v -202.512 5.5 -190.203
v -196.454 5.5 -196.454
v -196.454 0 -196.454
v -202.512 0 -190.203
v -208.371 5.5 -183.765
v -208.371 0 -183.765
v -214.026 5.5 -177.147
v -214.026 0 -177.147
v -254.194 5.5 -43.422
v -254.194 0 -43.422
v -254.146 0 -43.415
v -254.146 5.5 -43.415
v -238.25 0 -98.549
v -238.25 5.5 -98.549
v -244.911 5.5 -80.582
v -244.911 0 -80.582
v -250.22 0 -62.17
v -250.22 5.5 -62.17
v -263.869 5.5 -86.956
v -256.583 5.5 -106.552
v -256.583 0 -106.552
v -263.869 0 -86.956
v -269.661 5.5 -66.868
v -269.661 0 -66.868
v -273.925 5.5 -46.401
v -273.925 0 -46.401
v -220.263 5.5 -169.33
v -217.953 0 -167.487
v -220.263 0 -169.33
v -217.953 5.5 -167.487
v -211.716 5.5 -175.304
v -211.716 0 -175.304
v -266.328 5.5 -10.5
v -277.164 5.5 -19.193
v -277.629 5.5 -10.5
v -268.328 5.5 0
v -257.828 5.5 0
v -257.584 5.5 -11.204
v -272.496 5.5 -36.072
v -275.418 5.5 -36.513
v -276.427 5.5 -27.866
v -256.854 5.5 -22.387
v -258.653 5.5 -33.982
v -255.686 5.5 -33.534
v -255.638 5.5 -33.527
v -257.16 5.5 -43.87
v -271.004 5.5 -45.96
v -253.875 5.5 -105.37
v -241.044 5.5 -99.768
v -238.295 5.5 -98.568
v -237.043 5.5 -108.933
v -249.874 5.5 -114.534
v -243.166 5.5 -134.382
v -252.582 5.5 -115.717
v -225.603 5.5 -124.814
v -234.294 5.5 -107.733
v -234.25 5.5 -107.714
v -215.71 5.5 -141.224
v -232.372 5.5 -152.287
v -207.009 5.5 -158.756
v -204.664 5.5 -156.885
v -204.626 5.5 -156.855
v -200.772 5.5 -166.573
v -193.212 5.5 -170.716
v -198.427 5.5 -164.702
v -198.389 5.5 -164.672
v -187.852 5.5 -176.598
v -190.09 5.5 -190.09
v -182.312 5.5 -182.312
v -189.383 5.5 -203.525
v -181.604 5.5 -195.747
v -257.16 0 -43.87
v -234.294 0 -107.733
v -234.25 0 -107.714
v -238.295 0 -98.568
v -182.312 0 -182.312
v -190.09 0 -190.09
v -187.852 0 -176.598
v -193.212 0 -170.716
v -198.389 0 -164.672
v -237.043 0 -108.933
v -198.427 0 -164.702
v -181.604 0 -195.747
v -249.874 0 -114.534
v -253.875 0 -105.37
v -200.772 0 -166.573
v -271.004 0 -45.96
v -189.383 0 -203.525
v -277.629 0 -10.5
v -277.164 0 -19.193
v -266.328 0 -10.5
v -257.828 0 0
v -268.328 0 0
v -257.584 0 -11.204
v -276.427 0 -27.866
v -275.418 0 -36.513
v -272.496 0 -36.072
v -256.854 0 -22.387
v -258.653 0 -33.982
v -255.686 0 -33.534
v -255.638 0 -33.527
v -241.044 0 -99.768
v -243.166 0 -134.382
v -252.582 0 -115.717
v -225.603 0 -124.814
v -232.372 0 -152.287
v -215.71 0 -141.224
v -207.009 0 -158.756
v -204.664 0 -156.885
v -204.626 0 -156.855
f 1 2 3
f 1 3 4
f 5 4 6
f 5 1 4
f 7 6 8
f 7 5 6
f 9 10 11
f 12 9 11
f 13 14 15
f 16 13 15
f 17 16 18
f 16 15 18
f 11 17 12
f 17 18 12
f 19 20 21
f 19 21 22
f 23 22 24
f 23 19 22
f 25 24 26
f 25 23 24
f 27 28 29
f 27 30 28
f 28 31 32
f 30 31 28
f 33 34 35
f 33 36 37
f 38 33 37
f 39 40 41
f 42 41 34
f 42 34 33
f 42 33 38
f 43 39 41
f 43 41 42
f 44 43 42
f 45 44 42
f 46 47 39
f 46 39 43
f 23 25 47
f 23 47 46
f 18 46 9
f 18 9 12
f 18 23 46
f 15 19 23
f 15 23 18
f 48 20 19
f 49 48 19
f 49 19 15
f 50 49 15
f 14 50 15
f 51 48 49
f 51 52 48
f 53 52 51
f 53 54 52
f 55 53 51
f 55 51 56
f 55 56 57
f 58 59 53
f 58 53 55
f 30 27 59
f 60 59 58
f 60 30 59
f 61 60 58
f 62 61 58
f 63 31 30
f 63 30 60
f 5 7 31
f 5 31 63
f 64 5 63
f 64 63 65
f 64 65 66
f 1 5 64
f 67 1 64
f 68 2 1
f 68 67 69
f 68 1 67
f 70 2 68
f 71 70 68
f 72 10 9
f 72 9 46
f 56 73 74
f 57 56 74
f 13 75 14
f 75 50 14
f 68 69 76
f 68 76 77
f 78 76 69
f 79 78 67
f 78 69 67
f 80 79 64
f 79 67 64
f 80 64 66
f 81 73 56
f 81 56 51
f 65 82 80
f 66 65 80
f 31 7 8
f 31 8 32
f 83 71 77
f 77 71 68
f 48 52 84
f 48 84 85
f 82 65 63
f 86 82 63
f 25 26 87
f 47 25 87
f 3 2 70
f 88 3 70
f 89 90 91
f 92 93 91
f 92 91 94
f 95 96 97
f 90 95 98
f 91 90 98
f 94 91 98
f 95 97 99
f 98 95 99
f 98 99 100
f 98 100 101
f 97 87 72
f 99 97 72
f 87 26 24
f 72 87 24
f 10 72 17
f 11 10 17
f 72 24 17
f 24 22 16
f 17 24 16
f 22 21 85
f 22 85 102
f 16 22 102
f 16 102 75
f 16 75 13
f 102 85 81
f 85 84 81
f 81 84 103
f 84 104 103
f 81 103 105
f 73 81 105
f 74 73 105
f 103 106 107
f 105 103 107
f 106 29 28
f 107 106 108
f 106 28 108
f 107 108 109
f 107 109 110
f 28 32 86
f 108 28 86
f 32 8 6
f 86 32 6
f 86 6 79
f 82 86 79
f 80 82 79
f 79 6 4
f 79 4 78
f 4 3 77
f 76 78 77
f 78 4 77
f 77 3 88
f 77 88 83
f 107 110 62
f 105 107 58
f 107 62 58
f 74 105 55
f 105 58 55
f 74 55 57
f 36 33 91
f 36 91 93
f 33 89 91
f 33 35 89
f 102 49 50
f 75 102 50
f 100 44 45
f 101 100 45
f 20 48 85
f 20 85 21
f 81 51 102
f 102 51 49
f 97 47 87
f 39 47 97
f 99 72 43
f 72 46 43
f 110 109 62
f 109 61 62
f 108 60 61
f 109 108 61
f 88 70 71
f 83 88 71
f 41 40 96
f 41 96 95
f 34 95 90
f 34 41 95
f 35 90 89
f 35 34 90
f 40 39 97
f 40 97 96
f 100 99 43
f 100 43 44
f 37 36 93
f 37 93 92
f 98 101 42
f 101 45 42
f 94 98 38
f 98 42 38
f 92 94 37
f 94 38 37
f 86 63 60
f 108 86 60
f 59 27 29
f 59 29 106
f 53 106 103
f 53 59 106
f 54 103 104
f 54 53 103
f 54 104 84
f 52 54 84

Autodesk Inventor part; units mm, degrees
ref_plane "YZ Plane" through (0, 0, 0) normal (1, 0, 0) x (0, 1, 0)
ref_plane "XZ Plane" through (0, 0, 0) normal (0, 1, 0) x (-1, 0, 0)
ref_plane "XY Plane" through (0, 0, 0) normal (0, 0, 1) x (1, 0, 0)
sketch "スケッチ1" plane through (0, 0, 0) normal (0, 1, 0) x (-1, 0, 0)
  circle A0 centre (0, 0) radius 178.1675
  circle A1 centre (0, 0) radius 157.8276
  line L0 (168.1877, 0) -> (166.7488, -21.9529)
  line L1 (168.1877, 0) -> (130.1721, 2.4917) construction
  line L2 (249.4344, 0) -> (-249.4344, 0) projected
  line L3 (166.7488, -21.9529) -> (156.7702, -21.2989)
  line L4 (156.7702, -21.2989) -> (158.2091, 0.654) construction
  line L5 (158.2091, 0.654) -> (168.1877, 0)
  line L6 (157.4896, -10.3224) -> (0, 0)
  line L7 (166.7488, -21.9529) -> (162.4568, -43.5302)
  line L8 (162.4568, -43.5302) -> (152.649, -41.5793) construction
  line L9 (152.649, -41.5793) -> (156.9409, -20.002) construction
  line L10 (156.9409, -20.002) -> (166.7488, -21.9529) construction
  line L11 (162.4568, -43.5302) -> (155.3851, -64.3626)
  line L12 (155.3851, -64.3626) -> (145.9158, -61.1482) construction
  line L13 (145.9158, -61.1482) -> (152.9875, -40.3158) construction
  line L14 (152.9875, -40.3158) -> (162.4568, -43.5302) construction
  line L15 (155.3851, -64.3626) -> (145.6548, -84.0938)
  line L16 (145.6548, -84.0938) -> (136.6861, -79.6709) construction
  line L17 (136.6861, -79.6709) -> (146.4164, -59.9397) construction
  line L18 (146.4164, -59.9397) -> (155.3851, -64.3626) construction
  line L19 (0, 0) -> (111.6009, -111.6009)
  line L20 (145.6548, -84.0938) -> (137.3401, -78.5381) construction
  line L21 (137.3401, -78.5381) -> (125.1176, -96.8305) construction
  line L22 (125.1176, -96.8305) -> (133.4323, -102.3862) construction
  line L23 (133.4323, -102.3862) -> (145.6548, -84.0938)
  line L24 (133.4323, -102.3862) -> (125.9139, -95.7927) construction
  line L25 (125.9139, -95.7927) -> (111.4082, -112.3332) construction
  line L26 (111.4082, -112.3332) -> (118.9266, -118.9266)
  line L27 (118.9266, -118.9266) -> (133.4323, -102.3862)
  line L28 (111.6009, -111.6009) -> (118.9266, -118.9266)
  line L29 (166.7488, -21.9529) -> (176.7274, -22.6069) construction
  line L30 (118.9266, -118.9266) -> (125.9834, -125.9834)
  point P0 (154.795, -30.7906)
  point P1 (149.4517, -50.732)
  point P2 (141.5512, -69.8053)
  point P3 (131.2288, -87.6843)
  point P4 (118.661, -104.0629)
  point P5 (157.8276, 0)
  point P6 (178.1675, 0)
  dimension "d0" = 22
  dimension "d1" = 10
  dimension "d2" = 45
  dimension "d4" = 315.6551
extrude "押し出し1" add sketch "スケッチ1" along normal blind 5.5 contours L30 L27 L23 L15 L11 L7 L0 L2 A0 | L28 A1 L2 L0 L7 L11 L15 L23 L27
sketch "スケッチ2" plane through (0, 5.5, 0) normal (0, 1, 0) x (1, 0, 0)
  circle A0 centre (0, 0) radius 277.8276
  line L0 (-168.1877, 0) -> (-166.7488, 21.9529) projected
  line L1 (-166.7488, 21.9529) -> (-162.4568, 43.5302) projected
  line L2 (-162.4568, 43.5302) -> (-155.3851, 64.3626) projected
  line L3 (-155.3851, 64.3626) -> (-145.6548, 84.0938) projected
  line L4 (-133.4323, 102.3862) -> (-145.6548, 84.0938) projected
  line L5 (-118.9266, 118.9266) -> (-133.4323, 102.3862) projected
  line L6 (-167.4682, 10.9764) -> (-166.0294, 32.9293)
  line L7 (-166.0294, 32.9293) -> (-275.7938, 40.1237)
  line L8 (-275.7938, 40.1237) -> (-277.2327, 18.1708)
  line L9 (-277.2327, 18.1708) -> (-167.4682, 10.9764)
  line L10 (-164.6028, 32.7415) -> (-160.3108, 54.3188)
  line L11 (-160.3108, 54.3188) -> (-268.1972, 75.7787)
  line L12 (-268.1972, 75.7787) -> (-272.4892, 54.2015)
  line L13 (-272.4892, 54.2015) -> (-164.6028, 32.7415)
  circle A1 centre (-166.7488, 21.9529) radius 11
  circle A2 centre (-162.4568, 43.5302) radius 11
  line L14 (-158.921, 53.9464) -> (-151.8493, 74.7789)
  line L15 (-151.8493, 74.7789) -> (-256.0116, 110.1372)
  line L16 (-256.0116, 110.1372) -> (-263.0833, 89.3047)
  line L17 (-263.0833, 89.3047) -> (-158.921, 53.9464)
  circle A3 centre (-155.3851, 64.3626) radius 11
  arc A4 (-275.7591, 62.4834) -> (-281.3553, 41.7349) centre (-166.7488, 21.9529) ccw
  line L18 (-178.1663, 0.654) -> (-158.2091, -0.654)
  line L19 (-158.2091, -0.654) -> (-156.7702, 21.2989)
  line L20 (-156.7702, 21.2989) -> (-176.7274, 22.6069)
  line L21 (-176.7274, 22.6069) -> (-178.1663, 0.654)
  line L22 (-177.4468, 11.6305) -> (-275.7938, 40.1237)
  line L23 (-176.7274, 22.6069) -> (-176.008, 33.5834)
  line L24 (-176.008, 33.5834) -> (-275.7591, 62.4834)
  line L25 (-275.7938, 40.1237) -> (-281.3553, 41.7349)
  circle A5 centre (0, 0) radius 137.8276
  line L26 (0, 0) -> (-196.4538, 196.4538)
  line L27 (-111.6009, 111.6009) -> (-125.9834, 125.9834) projected
  line L28 (-433.7586, 0) -> (433.7586, 0) projected
  circle A6 centre (0, 0) radius 257.8276 construction
  arc A7 (-111.6009, 111.6009) -> (-157.8276, 0) centre (0, 0) ccw projected
  point P0 (-158.1662, 0)
  point P1 (-137.8276, 0)
  point P2 (-97.4588, 97.4588)
  point P3 (-277.8276, 0)
  dimension "d7" = 22
  dimension "d10" = 20
  dimension "d11" = 100
  dimension "d12" = 20
  dimension "d14" = 20
  dimension "d17" = 100
extrude "押し出し2" add sketch "スケッチ2" against normal blind 5.5 contours L26 L5 L4 L3 A3 L15 A0 | A0 L9 L21 L18 L28 | L15 A3 L17 A0 | A0 L22 L9 | L18 L21 L9 L0 | L0 A1 L19 L28 | A5 L28 A7 A1 A2 A3 L26 | L17 A2 L11 A0 | A3 L3 L14 | L14 L2 A3 | L26 A7 A3 L3 L4 L5 | A0 L7 L23 A1 L21 L22 | L21 A1 L9 | A1 L21 L20 L0 | L0 L20 L19 A1 | L19 A7 L28 | L11 A2 L13 L24 A0 | A2 A7 L1 L2 | L2 L10 A2 | A3 A7 A2 | L2 L3 A3 A7 | A0 L13 L24 L7 | A1 L23 L21 | L6 A1 L1 | L20 L23 A1 L6 | L1 A1 A7 L19 L20 | A1 A7 L19 | A3 A7 | L24 L13 A0 | L10 L1 A2 | A2 A7 | L24 L13 A1 L7 | L7 A1 L23 | A2 A7 A1 | A7 A1
sketch "スケッチ3" plane through (0, 5.5, 0) normal (0, 1, 0) x (1, 0, 0)
  circle A0 centre (0, 0) radius 257.8276
  arc A1 (-97.4588, 97.4588) -> (-137.8276, 0) centre (0, 0) ccw projected
  line L0 (-97.4588, 97.4588) -> (-196.4538, 196.4538) projected
  line L1 (-277.8276, 0) -> (-137.8276, 0) projected
  arc A2 (-196.4538, 196.4538) -> (-277.8276, 0) centre (0, 0) ccw projected
  point P0 (-257.8276, 0)
  point P1 (-182.3116, 182.3116)
  dimension "d21" = 20
extrude "押し出し3" cut sketch "スケッチ3" against normal through all contours L0 A1 L1 A0 picked at (-202.0143, 80.8888)
sketch "スケッチ5" plane through (0, 5.5, 0) normal (0, 1, 0) x (1, 0, 0)
  line L0 (-196.4538, 196.4538) -> (-182.3116, 182.3116) projected
  line L1 (-196.4538, 196.4538) -> (-189.3827, 203.5248)
  line L2 (-189.3827, 203.5248) -> (-181.6045, 195.7467)
  line L3 (-181.6045, 195.7467) -> (-190.0898, 190.0898)
  line L4 (-189.3827, 189.3827) -> (-192.1791, 186.5862)
  line L5 (-182.3116, 182.3116) -> (-196.4538, 196.4538) projected
  point P0 (0, 0)
  dimension "d30" = 1
  dimension "d31" = 1
  dimension "d33" = 10
extrude "押し出し5" add sketch "スケッチ5" against normal up to surface (5.5 mm away)
sketch "スケッチ6" plane through (0, 5.5, 0) normal (0, 1, 0) x (1, 0, 0)
  line L0 (-277.8276, 0) -> (-277.8276, 10.5)
  line L1 (-277.8276, 10.5) -> (-266.3276, 10.5)
  line L2 (-266.3276, 10.5) -> (-268.3276, 0)
  line L3 (-257.8276, 0) -> (-277.8276, 0) projected
  line L4 (-277.8276, 0) -> (-257.8276, 0) projected
  point P0 (0, 0)
  point P1 (-267.8276, 0)
  point P2 (-267.8276, 0)
  dimension "d36" = 0.5
  dimension "d37" = 1.5
  dimension "d38" = 10.5
extrude "押し出し6" cut sketch "スケッチ6" against normal through all
sketch "スケッチ7" plane through (0, 5.5, 0) normal (0, 1, 0) x (1, 0, 0)
  line L0 (0, 0) -> (-254.6239, 111.1523) construction
  line L1 (-182.3116, 182.3116) -> (-190.0898, 190.0898) projected
  line L2 (0, 0) -> (-182.3116, 182.3116) construction
  line L3 (-277.6291, 10.5) -> (-266.3276, 10.5) projected
  line L4 (0, 0) -> (-277.6291, 10.5) construction
  arc A0 (-196.4538, 196.4538) -> (-277.6291, 10.5) centre (0, 0) ccw projected
  line L5 (-256.6243, 106.5698) -> (-252.6235, 115.7347) construction
  line L6 (-252.6235, 115.7347) -> (-249.8741, 114.5344)
  line L7 (-249.8741, 114.5344) -> (-253.8748, 105.3696)
  line L8 (-253.8748, 105.3696) -> (-256.6243, 106.5698)
  line L9 (-238.2947, 98.5683) -> (-234.2939, 107.7331) construction
  line L10 (-234.2939, 107.7331) -> (-237.0433, 108.9334)
  line L11 (-237.0433, 108.9334) -> (-241.0441, 99.7685)
  line L12 (-241.0441, 99.7685) -> (-238.2947, 98.5683)
  arc A1 (-182.3116, 182.3116) -> (-257.8276, 0) centre (0, 0) ccw projected
  line L13 (-238.2947, 98.5683) -> (-238.2502, 98.5489)
  arc A2 (-182.3116, 182.3116) -> (-257.8276, 0) centre (0, 0) ccw projected
  line L14 (-234.2939, 107.7331) -> (-234.2495, 107.7137)
  point P0 (-236.2943, 103.1507)
  point P1 (-252.5823, 115.7167)
  point P2 (-256.5831, 106.5518)
  dimension "d41" = 3
  dimension "d42" = 10
extrude "押し出し7" cut sketch "スケッチ7" against normal through all
pattern_circular "円形状パターン1" count 2 over 15 about axis through (0, -10, 0) along (0, 1, 0) of "押し出し7"
pattern_circular "円形状パターン2" count 2 over 15 about axis through (0, -10, 0) along (0, -1, 0) of "押し出し7"
properties part number "front_under" material "木材 (カエデ材)"
